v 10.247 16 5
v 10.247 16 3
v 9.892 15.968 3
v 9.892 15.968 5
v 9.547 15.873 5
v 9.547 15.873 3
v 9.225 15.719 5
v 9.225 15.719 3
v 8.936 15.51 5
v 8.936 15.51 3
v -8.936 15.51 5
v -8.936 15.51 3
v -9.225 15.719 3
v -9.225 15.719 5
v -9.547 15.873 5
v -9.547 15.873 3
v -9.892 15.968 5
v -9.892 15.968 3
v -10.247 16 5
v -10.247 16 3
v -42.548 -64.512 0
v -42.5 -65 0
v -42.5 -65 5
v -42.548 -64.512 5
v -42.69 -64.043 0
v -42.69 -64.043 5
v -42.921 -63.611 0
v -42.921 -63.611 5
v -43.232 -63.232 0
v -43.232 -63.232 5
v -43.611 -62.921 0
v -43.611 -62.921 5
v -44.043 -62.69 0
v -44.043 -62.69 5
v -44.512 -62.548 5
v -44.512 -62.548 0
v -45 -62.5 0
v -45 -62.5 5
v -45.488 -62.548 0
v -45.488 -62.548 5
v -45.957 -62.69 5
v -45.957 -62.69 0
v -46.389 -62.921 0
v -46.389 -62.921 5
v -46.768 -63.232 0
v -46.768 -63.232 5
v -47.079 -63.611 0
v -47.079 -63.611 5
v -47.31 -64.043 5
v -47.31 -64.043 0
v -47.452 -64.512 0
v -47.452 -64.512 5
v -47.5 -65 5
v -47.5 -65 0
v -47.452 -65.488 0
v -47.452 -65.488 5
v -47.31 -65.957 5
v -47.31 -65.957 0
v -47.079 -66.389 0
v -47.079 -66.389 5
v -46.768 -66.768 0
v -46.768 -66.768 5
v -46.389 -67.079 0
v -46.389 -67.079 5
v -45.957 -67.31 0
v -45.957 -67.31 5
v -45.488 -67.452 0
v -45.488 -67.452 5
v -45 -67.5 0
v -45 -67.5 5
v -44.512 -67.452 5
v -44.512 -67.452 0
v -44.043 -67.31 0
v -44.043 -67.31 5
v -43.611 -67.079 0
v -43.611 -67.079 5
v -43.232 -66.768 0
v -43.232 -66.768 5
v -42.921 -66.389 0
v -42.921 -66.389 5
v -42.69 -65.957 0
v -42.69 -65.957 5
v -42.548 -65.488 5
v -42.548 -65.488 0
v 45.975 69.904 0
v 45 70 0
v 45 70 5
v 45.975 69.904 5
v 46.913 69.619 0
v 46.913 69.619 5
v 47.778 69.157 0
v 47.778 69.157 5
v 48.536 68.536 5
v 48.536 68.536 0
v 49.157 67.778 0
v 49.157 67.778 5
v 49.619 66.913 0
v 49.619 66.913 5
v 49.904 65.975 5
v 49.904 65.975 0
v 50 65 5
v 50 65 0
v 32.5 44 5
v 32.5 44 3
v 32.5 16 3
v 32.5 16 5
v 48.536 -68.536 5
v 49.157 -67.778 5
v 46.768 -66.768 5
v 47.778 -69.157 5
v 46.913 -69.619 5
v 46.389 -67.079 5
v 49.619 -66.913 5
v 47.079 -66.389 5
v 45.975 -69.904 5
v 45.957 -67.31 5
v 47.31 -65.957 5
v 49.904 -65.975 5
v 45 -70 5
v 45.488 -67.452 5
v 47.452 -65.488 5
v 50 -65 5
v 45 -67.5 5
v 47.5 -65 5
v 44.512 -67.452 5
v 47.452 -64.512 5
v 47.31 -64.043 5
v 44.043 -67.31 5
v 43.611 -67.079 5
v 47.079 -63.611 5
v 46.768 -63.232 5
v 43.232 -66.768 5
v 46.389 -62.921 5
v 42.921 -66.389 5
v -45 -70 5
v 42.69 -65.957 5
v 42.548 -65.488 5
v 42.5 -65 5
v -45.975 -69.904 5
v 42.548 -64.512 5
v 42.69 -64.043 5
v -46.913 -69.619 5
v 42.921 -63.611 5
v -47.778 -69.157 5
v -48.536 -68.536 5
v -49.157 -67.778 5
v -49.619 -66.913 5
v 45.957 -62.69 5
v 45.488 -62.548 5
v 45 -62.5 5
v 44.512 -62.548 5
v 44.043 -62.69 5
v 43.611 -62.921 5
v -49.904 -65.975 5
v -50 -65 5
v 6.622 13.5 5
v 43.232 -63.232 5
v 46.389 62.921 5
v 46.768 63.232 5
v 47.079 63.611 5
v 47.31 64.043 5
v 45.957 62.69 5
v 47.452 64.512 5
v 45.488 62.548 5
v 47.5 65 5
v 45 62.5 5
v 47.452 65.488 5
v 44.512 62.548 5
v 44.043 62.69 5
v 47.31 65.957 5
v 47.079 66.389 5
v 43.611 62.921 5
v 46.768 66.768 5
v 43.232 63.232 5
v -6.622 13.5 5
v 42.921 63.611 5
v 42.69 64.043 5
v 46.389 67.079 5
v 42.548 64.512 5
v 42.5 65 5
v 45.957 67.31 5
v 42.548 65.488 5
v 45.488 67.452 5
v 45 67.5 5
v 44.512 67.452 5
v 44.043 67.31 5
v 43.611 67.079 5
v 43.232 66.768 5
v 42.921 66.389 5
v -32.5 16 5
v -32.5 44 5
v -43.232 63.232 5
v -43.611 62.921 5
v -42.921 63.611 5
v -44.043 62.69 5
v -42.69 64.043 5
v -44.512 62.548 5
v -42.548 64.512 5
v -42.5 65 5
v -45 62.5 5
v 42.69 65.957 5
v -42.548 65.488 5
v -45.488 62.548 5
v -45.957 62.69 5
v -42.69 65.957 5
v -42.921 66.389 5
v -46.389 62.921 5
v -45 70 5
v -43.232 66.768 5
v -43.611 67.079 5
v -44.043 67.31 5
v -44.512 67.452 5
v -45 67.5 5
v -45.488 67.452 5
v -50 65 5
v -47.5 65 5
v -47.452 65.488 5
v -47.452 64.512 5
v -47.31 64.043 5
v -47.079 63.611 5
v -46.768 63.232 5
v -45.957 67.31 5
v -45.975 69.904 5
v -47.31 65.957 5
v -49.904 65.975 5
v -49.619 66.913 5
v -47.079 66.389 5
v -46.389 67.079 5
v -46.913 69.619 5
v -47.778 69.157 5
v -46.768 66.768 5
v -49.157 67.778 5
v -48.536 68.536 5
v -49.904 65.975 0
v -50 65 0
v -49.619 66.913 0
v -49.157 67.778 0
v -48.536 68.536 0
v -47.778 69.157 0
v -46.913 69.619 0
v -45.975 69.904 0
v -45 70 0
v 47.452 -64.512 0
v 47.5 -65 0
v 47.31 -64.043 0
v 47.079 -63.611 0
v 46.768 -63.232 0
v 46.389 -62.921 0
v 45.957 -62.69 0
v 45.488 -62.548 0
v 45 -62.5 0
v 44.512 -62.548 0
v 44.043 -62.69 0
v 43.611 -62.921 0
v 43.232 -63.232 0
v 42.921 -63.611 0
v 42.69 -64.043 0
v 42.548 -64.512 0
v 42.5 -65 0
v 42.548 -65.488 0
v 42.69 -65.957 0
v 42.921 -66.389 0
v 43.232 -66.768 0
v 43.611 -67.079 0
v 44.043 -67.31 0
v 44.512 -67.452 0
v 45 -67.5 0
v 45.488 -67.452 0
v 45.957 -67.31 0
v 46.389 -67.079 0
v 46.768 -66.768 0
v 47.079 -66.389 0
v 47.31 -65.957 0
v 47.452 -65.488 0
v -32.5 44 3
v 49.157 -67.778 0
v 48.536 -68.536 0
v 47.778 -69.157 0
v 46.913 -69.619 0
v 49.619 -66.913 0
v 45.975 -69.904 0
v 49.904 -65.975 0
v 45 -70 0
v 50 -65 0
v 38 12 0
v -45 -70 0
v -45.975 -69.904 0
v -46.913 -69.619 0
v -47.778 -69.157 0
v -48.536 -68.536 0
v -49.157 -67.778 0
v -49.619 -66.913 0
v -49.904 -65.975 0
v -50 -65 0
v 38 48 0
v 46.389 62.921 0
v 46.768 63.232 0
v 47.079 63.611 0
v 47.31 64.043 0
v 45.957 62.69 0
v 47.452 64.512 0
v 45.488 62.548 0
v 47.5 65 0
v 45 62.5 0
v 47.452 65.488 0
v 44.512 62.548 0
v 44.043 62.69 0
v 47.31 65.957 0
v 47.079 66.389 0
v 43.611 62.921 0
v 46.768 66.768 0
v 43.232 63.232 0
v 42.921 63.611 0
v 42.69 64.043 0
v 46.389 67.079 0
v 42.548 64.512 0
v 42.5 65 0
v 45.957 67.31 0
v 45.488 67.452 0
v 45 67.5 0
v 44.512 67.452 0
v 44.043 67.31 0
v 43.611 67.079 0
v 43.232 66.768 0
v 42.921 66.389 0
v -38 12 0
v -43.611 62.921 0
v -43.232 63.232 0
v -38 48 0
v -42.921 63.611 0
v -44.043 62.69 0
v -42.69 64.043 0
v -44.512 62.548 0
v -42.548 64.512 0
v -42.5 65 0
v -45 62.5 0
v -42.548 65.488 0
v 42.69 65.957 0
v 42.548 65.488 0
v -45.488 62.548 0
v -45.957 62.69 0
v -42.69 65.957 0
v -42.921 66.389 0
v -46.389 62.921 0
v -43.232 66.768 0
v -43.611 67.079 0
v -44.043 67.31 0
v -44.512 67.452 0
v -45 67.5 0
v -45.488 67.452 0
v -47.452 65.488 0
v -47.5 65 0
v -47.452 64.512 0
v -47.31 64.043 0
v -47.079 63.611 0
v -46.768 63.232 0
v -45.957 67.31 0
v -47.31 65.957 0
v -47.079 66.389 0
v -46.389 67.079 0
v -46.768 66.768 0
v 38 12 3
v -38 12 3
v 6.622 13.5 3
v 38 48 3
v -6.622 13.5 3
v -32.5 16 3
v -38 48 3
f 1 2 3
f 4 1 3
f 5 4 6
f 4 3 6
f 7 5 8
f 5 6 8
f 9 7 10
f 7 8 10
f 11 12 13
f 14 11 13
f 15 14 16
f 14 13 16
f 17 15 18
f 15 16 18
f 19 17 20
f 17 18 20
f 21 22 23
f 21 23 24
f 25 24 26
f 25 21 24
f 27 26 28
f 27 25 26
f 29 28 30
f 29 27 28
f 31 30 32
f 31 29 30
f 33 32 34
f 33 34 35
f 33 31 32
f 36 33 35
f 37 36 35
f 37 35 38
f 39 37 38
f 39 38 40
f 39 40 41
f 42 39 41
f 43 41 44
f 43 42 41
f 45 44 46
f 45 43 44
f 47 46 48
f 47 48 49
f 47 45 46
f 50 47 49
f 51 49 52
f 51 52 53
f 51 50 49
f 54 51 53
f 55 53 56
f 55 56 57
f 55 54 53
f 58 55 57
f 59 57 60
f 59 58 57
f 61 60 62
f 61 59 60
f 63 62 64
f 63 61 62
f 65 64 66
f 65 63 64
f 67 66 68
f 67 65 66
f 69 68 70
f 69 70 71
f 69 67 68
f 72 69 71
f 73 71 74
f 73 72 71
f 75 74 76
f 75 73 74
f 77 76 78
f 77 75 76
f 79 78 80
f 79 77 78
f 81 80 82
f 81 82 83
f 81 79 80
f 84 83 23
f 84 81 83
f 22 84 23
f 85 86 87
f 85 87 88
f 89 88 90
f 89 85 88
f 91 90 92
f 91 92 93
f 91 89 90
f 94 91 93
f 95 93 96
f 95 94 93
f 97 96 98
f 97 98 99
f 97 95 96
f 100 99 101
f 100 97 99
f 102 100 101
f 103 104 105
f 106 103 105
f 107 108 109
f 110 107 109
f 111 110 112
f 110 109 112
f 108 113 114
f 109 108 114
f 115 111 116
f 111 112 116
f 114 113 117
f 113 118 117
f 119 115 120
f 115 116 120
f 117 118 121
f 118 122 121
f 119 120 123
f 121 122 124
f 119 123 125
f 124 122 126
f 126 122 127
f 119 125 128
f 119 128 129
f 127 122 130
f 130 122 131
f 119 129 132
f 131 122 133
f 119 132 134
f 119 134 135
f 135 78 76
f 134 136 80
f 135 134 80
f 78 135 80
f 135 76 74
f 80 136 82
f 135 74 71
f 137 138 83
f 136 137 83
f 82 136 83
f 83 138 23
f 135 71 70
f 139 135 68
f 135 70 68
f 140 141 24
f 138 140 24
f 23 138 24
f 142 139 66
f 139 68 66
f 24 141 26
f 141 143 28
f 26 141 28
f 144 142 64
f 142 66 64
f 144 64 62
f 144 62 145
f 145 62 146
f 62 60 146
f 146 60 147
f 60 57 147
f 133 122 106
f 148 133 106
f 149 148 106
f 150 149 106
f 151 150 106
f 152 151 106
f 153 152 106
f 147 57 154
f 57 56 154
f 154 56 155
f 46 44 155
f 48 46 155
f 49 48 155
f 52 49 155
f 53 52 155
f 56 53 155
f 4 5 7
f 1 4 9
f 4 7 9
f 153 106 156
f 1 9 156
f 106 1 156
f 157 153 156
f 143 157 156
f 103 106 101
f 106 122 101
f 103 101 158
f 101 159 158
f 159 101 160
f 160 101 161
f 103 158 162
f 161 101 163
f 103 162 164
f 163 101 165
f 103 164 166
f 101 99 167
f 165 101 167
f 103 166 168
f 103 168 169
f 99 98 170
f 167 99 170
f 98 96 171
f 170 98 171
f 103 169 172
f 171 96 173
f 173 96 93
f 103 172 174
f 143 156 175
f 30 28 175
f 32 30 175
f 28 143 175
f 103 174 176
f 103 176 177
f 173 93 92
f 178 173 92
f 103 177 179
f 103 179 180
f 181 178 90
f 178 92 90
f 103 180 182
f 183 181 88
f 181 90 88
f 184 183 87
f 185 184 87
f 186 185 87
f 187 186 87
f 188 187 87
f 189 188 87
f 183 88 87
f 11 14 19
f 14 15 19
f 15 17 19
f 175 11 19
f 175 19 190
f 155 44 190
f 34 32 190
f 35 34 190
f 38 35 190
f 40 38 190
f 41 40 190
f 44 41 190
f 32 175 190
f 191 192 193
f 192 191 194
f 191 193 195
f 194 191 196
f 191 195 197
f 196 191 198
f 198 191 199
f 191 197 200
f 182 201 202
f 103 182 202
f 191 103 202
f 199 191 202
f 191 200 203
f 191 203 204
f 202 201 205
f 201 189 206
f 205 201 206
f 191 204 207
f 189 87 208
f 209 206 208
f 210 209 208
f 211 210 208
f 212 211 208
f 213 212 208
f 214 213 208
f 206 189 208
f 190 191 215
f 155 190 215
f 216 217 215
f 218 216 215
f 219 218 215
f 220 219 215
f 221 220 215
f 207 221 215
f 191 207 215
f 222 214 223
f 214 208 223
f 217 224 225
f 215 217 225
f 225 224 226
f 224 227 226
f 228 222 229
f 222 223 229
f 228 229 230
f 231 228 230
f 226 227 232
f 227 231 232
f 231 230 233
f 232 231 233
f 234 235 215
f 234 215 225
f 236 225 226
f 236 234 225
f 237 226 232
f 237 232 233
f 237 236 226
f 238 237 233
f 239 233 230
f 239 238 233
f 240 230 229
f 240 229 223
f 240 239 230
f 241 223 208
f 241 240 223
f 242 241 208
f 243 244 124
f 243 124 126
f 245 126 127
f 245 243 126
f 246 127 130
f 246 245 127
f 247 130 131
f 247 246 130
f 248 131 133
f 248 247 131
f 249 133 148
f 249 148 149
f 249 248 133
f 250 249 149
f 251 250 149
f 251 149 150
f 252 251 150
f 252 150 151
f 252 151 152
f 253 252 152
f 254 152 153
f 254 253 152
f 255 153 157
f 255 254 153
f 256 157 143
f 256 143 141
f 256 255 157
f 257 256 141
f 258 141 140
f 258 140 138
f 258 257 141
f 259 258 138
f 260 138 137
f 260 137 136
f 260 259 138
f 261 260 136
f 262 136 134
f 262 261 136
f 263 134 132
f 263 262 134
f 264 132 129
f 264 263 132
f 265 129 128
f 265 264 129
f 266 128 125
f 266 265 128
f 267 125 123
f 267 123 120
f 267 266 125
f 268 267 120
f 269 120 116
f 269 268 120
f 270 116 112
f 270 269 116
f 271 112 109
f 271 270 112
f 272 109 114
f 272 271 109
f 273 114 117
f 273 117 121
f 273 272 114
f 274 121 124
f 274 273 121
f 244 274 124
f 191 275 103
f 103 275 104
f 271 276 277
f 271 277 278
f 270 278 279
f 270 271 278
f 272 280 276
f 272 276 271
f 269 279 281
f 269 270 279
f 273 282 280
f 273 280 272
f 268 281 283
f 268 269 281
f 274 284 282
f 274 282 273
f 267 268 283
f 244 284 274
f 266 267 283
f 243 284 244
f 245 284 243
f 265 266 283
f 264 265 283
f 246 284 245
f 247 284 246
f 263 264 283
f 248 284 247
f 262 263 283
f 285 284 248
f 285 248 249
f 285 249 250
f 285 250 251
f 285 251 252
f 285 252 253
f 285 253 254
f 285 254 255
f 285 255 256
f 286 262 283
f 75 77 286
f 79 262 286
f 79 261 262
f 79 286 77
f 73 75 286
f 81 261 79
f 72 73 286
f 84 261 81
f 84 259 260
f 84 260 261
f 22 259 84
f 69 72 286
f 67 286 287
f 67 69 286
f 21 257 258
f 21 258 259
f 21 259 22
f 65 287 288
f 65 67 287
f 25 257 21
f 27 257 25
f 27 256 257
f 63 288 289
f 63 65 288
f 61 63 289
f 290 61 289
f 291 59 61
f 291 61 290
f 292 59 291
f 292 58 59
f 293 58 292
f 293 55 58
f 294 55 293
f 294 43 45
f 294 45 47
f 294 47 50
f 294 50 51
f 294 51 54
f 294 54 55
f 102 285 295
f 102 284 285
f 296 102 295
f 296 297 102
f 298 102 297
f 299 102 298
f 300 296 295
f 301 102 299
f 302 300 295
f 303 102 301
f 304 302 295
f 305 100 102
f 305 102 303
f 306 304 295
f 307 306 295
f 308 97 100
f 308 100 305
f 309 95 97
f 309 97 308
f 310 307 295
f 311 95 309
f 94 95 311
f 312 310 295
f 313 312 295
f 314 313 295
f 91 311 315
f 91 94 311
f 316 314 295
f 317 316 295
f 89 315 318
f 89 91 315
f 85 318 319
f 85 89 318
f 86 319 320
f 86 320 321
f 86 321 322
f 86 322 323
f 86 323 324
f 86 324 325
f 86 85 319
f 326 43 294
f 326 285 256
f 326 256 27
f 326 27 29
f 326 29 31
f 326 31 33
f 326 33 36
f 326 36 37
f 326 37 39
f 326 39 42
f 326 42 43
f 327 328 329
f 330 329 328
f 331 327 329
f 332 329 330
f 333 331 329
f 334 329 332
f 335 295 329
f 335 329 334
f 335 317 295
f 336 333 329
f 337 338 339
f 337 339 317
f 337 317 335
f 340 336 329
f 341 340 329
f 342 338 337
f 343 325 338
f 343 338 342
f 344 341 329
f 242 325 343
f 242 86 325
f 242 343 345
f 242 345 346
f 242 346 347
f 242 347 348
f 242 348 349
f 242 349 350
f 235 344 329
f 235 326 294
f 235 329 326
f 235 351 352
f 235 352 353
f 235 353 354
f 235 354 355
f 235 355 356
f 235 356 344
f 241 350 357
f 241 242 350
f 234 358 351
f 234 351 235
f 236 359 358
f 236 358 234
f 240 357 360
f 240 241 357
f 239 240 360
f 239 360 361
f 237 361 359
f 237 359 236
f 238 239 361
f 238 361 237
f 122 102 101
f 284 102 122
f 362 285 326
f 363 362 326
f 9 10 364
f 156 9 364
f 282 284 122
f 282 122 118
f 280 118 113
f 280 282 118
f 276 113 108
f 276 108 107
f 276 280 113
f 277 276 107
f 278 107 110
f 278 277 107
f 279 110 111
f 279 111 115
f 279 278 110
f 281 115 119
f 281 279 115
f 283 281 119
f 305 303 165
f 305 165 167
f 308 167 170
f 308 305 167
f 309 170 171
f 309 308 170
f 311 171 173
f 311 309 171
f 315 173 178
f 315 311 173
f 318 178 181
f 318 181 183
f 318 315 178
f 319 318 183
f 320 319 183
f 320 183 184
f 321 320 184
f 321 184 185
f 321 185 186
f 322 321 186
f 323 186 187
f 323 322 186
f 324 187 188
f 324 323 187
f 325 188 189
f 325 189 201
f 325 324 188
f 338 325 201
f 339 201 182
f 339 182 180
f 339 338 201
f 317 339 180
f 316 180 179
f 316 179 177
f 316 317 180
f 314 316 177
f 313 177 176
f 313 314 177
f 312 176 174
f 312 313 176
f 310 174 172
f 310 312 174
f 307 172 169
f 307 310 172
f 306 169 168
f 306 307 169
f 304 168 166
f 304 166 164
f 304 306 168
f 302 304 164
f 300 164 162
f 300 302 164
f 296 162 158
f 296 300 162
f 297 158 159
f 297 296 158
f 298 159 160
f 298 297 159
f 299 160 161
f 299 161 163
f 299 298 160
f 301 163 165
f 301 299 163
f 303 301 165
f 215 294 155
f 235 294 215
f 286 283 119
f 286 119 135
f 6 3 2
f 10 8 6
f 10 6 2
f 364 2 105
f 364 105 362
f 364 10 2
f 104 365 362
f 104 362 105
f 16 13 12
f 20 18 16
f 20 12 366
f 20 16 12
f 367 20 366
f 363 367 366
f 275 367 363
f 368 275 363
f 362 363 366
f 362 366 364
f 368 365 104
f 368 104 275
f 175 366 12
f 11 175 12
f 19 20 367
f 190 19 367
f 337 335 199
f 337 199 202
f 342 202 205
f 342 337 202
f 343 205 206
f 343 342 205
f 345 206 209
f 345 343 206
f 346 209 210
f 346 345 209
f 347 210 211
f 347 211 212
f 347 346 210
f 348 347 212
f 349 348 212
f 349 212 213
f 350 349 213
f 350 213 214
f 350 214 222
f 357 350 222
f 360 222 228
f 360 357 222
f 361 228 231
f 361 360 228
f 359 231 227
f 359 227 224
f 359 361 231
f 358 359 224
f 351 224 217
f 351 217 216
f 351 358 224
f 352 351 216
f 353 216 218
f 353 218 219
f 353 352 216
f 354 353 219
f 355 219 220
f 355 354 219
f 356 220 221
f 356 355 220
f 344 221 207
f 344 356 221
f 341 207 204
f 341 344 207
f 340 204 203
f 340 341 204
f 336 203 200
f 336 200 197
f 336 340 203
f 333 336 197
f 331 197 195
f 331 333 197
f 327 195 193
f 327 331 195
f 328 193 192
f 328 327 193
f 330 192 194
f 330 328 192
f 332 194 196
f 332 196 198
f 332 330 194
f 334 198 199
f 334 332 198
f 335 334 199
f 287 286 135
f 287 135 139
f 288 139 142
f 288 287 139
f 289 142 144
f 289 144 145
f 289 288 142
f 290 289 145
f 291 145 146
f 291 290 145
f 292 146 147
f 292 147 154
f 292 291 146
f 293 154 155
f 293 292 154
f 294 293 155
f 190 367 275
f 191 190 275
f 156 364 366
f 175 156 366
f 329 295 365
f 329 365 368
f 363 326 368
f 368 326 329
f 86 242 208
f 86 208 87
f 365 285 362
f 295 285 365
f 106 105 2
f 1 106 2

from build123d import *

# Parameters (mm, degrees)
SKETCH1_R           = 2.5
BOSS_EXTRUDE1_DEPTH = 5
CUT_EXTRUDE1_DEPTH  = 5
SKETCH2_4_W         = 76
SKETCH2_4_H         = 36
CUT_EXTRUDE2_DEPTH  = 3


with BuildPart() as part:
    # Sketch1 → Boss-Extrude1 (new body)
    with BuildSketch(Plane.XY):
        with BuildLine():
            Line((45, 70), (-45, 70))
            ThreePointArc((-45, 70), (-48.535533906, 68.535533906), (-50, 65))
            Line((-50, 65), (-50, -65))
            ThreePointArc((-50, -65), (-48.535533906, -68.535533906), (-45, -70))
            Line((-45, -70), (45, -70))
            ThreePointArc((45, -70), (48.535533906, -68.535533906), (50, -65))
            Line((50, -65), (50, 65))
            ThreePointArc((50, 65), (48.535533906, 68.535533906), (45, 70))
        make_face()
        with Locations((-45, -65)):
            Circle(SKETCH1_R, mode=Mode.SUBTRACT)
        with Locations((45, -65)):
            Circle(SKETCH1_R, mode=Mode.SUBTRACT)
        with Locations((45, 65)):
            Circle(SKETCH1_R, mode=Mode.SUBTRACT)
        with Locations((-45, 65)):
            Circle(SKETCH1_R, mode=Mode.SUBTRACT)
    extrude(amount=BOSS_EXTRUDE1_DEPTH)

    # Sketch2 → Cut-Extrude1 (cut)
    with BuildSketch(Plane(origin=(0, 0, 0), x_dir=(-1, 0, 0), z_dir=(0, 0, -1))):
        with BuildLine():
            ThreePointArc((-10.247345781, 16), (-9.547279148, 15.873474502), (-8.935788795, 15.50990671))
            Line((-8.935788795, 15.50990671), (-6.621919354, 13.5))
            Line((-6.621919354, 13.5), (6.621919354, 13.5))
            Line((6.621919354, 13.5), (8.935788795, 15.50990671))
            ThreePointArc((8.935788795, 15.50990671), (9.547279148, 15.873474502), (10.247345781, 16))
            Line((10.247345781, 16), (32.5, 16))
            Line((32.5, 16), (32.5, 44))
            Line((32.5, 44), (-32.5, 44))
            Line((-32.5, 44), (-32.5, 16))
            Line((-32.5, 16), (-10.247345781, 16))
        make_face()
    extrude(amount=-CUT_EXTRUDE1_DEPTH, mode=Mode.SUBTRACT)

    # Sketch2<4> → Cut-Extrude2 (cut)
    with BuildSketch(Plane(origin=(0, 0, 0), x_dir=(-1, 0, 0), z_dir=(0, 0, -1))):
        with Locations((0, 30)):
            Rectangle(SKETCH2_4_W, SKETCH2_4_H)
        with BuildLine():
            Line((-8.935788795, 15.50990671), (-6.621919354, 13.5))
            Line((-6.621919354, 13.5), (6.621919354, 13.5))
            Line((6.621919354, 13.5), (8.935788795, 15.50990671))
            ThreePointArc((8.935788795, 15.50990671), (9.547279148, 15.873474502), (10.247345781, 16))
            Line((10.247345781, 16), (32.5, 16))
            Line((32.5, 16), (32.5, 44))
            Line((32.5, 44), (-32.5, 44))
            Line((-32.5, 44), (-32.5, 16))
            Line((-32.5, 16), (-10.247345781, 16))
            ThreePointArc((-10.247345781, 16), (-9.547279148, 15.873474502), (-8.935788795, 15.50990671))
        make_face(mode=Mode.SUBTRACT)
    extrude(amount=-CUT_EXTRUDE2_DEPTH, mode=Mode.SUBTRACT)


solid = part.part
